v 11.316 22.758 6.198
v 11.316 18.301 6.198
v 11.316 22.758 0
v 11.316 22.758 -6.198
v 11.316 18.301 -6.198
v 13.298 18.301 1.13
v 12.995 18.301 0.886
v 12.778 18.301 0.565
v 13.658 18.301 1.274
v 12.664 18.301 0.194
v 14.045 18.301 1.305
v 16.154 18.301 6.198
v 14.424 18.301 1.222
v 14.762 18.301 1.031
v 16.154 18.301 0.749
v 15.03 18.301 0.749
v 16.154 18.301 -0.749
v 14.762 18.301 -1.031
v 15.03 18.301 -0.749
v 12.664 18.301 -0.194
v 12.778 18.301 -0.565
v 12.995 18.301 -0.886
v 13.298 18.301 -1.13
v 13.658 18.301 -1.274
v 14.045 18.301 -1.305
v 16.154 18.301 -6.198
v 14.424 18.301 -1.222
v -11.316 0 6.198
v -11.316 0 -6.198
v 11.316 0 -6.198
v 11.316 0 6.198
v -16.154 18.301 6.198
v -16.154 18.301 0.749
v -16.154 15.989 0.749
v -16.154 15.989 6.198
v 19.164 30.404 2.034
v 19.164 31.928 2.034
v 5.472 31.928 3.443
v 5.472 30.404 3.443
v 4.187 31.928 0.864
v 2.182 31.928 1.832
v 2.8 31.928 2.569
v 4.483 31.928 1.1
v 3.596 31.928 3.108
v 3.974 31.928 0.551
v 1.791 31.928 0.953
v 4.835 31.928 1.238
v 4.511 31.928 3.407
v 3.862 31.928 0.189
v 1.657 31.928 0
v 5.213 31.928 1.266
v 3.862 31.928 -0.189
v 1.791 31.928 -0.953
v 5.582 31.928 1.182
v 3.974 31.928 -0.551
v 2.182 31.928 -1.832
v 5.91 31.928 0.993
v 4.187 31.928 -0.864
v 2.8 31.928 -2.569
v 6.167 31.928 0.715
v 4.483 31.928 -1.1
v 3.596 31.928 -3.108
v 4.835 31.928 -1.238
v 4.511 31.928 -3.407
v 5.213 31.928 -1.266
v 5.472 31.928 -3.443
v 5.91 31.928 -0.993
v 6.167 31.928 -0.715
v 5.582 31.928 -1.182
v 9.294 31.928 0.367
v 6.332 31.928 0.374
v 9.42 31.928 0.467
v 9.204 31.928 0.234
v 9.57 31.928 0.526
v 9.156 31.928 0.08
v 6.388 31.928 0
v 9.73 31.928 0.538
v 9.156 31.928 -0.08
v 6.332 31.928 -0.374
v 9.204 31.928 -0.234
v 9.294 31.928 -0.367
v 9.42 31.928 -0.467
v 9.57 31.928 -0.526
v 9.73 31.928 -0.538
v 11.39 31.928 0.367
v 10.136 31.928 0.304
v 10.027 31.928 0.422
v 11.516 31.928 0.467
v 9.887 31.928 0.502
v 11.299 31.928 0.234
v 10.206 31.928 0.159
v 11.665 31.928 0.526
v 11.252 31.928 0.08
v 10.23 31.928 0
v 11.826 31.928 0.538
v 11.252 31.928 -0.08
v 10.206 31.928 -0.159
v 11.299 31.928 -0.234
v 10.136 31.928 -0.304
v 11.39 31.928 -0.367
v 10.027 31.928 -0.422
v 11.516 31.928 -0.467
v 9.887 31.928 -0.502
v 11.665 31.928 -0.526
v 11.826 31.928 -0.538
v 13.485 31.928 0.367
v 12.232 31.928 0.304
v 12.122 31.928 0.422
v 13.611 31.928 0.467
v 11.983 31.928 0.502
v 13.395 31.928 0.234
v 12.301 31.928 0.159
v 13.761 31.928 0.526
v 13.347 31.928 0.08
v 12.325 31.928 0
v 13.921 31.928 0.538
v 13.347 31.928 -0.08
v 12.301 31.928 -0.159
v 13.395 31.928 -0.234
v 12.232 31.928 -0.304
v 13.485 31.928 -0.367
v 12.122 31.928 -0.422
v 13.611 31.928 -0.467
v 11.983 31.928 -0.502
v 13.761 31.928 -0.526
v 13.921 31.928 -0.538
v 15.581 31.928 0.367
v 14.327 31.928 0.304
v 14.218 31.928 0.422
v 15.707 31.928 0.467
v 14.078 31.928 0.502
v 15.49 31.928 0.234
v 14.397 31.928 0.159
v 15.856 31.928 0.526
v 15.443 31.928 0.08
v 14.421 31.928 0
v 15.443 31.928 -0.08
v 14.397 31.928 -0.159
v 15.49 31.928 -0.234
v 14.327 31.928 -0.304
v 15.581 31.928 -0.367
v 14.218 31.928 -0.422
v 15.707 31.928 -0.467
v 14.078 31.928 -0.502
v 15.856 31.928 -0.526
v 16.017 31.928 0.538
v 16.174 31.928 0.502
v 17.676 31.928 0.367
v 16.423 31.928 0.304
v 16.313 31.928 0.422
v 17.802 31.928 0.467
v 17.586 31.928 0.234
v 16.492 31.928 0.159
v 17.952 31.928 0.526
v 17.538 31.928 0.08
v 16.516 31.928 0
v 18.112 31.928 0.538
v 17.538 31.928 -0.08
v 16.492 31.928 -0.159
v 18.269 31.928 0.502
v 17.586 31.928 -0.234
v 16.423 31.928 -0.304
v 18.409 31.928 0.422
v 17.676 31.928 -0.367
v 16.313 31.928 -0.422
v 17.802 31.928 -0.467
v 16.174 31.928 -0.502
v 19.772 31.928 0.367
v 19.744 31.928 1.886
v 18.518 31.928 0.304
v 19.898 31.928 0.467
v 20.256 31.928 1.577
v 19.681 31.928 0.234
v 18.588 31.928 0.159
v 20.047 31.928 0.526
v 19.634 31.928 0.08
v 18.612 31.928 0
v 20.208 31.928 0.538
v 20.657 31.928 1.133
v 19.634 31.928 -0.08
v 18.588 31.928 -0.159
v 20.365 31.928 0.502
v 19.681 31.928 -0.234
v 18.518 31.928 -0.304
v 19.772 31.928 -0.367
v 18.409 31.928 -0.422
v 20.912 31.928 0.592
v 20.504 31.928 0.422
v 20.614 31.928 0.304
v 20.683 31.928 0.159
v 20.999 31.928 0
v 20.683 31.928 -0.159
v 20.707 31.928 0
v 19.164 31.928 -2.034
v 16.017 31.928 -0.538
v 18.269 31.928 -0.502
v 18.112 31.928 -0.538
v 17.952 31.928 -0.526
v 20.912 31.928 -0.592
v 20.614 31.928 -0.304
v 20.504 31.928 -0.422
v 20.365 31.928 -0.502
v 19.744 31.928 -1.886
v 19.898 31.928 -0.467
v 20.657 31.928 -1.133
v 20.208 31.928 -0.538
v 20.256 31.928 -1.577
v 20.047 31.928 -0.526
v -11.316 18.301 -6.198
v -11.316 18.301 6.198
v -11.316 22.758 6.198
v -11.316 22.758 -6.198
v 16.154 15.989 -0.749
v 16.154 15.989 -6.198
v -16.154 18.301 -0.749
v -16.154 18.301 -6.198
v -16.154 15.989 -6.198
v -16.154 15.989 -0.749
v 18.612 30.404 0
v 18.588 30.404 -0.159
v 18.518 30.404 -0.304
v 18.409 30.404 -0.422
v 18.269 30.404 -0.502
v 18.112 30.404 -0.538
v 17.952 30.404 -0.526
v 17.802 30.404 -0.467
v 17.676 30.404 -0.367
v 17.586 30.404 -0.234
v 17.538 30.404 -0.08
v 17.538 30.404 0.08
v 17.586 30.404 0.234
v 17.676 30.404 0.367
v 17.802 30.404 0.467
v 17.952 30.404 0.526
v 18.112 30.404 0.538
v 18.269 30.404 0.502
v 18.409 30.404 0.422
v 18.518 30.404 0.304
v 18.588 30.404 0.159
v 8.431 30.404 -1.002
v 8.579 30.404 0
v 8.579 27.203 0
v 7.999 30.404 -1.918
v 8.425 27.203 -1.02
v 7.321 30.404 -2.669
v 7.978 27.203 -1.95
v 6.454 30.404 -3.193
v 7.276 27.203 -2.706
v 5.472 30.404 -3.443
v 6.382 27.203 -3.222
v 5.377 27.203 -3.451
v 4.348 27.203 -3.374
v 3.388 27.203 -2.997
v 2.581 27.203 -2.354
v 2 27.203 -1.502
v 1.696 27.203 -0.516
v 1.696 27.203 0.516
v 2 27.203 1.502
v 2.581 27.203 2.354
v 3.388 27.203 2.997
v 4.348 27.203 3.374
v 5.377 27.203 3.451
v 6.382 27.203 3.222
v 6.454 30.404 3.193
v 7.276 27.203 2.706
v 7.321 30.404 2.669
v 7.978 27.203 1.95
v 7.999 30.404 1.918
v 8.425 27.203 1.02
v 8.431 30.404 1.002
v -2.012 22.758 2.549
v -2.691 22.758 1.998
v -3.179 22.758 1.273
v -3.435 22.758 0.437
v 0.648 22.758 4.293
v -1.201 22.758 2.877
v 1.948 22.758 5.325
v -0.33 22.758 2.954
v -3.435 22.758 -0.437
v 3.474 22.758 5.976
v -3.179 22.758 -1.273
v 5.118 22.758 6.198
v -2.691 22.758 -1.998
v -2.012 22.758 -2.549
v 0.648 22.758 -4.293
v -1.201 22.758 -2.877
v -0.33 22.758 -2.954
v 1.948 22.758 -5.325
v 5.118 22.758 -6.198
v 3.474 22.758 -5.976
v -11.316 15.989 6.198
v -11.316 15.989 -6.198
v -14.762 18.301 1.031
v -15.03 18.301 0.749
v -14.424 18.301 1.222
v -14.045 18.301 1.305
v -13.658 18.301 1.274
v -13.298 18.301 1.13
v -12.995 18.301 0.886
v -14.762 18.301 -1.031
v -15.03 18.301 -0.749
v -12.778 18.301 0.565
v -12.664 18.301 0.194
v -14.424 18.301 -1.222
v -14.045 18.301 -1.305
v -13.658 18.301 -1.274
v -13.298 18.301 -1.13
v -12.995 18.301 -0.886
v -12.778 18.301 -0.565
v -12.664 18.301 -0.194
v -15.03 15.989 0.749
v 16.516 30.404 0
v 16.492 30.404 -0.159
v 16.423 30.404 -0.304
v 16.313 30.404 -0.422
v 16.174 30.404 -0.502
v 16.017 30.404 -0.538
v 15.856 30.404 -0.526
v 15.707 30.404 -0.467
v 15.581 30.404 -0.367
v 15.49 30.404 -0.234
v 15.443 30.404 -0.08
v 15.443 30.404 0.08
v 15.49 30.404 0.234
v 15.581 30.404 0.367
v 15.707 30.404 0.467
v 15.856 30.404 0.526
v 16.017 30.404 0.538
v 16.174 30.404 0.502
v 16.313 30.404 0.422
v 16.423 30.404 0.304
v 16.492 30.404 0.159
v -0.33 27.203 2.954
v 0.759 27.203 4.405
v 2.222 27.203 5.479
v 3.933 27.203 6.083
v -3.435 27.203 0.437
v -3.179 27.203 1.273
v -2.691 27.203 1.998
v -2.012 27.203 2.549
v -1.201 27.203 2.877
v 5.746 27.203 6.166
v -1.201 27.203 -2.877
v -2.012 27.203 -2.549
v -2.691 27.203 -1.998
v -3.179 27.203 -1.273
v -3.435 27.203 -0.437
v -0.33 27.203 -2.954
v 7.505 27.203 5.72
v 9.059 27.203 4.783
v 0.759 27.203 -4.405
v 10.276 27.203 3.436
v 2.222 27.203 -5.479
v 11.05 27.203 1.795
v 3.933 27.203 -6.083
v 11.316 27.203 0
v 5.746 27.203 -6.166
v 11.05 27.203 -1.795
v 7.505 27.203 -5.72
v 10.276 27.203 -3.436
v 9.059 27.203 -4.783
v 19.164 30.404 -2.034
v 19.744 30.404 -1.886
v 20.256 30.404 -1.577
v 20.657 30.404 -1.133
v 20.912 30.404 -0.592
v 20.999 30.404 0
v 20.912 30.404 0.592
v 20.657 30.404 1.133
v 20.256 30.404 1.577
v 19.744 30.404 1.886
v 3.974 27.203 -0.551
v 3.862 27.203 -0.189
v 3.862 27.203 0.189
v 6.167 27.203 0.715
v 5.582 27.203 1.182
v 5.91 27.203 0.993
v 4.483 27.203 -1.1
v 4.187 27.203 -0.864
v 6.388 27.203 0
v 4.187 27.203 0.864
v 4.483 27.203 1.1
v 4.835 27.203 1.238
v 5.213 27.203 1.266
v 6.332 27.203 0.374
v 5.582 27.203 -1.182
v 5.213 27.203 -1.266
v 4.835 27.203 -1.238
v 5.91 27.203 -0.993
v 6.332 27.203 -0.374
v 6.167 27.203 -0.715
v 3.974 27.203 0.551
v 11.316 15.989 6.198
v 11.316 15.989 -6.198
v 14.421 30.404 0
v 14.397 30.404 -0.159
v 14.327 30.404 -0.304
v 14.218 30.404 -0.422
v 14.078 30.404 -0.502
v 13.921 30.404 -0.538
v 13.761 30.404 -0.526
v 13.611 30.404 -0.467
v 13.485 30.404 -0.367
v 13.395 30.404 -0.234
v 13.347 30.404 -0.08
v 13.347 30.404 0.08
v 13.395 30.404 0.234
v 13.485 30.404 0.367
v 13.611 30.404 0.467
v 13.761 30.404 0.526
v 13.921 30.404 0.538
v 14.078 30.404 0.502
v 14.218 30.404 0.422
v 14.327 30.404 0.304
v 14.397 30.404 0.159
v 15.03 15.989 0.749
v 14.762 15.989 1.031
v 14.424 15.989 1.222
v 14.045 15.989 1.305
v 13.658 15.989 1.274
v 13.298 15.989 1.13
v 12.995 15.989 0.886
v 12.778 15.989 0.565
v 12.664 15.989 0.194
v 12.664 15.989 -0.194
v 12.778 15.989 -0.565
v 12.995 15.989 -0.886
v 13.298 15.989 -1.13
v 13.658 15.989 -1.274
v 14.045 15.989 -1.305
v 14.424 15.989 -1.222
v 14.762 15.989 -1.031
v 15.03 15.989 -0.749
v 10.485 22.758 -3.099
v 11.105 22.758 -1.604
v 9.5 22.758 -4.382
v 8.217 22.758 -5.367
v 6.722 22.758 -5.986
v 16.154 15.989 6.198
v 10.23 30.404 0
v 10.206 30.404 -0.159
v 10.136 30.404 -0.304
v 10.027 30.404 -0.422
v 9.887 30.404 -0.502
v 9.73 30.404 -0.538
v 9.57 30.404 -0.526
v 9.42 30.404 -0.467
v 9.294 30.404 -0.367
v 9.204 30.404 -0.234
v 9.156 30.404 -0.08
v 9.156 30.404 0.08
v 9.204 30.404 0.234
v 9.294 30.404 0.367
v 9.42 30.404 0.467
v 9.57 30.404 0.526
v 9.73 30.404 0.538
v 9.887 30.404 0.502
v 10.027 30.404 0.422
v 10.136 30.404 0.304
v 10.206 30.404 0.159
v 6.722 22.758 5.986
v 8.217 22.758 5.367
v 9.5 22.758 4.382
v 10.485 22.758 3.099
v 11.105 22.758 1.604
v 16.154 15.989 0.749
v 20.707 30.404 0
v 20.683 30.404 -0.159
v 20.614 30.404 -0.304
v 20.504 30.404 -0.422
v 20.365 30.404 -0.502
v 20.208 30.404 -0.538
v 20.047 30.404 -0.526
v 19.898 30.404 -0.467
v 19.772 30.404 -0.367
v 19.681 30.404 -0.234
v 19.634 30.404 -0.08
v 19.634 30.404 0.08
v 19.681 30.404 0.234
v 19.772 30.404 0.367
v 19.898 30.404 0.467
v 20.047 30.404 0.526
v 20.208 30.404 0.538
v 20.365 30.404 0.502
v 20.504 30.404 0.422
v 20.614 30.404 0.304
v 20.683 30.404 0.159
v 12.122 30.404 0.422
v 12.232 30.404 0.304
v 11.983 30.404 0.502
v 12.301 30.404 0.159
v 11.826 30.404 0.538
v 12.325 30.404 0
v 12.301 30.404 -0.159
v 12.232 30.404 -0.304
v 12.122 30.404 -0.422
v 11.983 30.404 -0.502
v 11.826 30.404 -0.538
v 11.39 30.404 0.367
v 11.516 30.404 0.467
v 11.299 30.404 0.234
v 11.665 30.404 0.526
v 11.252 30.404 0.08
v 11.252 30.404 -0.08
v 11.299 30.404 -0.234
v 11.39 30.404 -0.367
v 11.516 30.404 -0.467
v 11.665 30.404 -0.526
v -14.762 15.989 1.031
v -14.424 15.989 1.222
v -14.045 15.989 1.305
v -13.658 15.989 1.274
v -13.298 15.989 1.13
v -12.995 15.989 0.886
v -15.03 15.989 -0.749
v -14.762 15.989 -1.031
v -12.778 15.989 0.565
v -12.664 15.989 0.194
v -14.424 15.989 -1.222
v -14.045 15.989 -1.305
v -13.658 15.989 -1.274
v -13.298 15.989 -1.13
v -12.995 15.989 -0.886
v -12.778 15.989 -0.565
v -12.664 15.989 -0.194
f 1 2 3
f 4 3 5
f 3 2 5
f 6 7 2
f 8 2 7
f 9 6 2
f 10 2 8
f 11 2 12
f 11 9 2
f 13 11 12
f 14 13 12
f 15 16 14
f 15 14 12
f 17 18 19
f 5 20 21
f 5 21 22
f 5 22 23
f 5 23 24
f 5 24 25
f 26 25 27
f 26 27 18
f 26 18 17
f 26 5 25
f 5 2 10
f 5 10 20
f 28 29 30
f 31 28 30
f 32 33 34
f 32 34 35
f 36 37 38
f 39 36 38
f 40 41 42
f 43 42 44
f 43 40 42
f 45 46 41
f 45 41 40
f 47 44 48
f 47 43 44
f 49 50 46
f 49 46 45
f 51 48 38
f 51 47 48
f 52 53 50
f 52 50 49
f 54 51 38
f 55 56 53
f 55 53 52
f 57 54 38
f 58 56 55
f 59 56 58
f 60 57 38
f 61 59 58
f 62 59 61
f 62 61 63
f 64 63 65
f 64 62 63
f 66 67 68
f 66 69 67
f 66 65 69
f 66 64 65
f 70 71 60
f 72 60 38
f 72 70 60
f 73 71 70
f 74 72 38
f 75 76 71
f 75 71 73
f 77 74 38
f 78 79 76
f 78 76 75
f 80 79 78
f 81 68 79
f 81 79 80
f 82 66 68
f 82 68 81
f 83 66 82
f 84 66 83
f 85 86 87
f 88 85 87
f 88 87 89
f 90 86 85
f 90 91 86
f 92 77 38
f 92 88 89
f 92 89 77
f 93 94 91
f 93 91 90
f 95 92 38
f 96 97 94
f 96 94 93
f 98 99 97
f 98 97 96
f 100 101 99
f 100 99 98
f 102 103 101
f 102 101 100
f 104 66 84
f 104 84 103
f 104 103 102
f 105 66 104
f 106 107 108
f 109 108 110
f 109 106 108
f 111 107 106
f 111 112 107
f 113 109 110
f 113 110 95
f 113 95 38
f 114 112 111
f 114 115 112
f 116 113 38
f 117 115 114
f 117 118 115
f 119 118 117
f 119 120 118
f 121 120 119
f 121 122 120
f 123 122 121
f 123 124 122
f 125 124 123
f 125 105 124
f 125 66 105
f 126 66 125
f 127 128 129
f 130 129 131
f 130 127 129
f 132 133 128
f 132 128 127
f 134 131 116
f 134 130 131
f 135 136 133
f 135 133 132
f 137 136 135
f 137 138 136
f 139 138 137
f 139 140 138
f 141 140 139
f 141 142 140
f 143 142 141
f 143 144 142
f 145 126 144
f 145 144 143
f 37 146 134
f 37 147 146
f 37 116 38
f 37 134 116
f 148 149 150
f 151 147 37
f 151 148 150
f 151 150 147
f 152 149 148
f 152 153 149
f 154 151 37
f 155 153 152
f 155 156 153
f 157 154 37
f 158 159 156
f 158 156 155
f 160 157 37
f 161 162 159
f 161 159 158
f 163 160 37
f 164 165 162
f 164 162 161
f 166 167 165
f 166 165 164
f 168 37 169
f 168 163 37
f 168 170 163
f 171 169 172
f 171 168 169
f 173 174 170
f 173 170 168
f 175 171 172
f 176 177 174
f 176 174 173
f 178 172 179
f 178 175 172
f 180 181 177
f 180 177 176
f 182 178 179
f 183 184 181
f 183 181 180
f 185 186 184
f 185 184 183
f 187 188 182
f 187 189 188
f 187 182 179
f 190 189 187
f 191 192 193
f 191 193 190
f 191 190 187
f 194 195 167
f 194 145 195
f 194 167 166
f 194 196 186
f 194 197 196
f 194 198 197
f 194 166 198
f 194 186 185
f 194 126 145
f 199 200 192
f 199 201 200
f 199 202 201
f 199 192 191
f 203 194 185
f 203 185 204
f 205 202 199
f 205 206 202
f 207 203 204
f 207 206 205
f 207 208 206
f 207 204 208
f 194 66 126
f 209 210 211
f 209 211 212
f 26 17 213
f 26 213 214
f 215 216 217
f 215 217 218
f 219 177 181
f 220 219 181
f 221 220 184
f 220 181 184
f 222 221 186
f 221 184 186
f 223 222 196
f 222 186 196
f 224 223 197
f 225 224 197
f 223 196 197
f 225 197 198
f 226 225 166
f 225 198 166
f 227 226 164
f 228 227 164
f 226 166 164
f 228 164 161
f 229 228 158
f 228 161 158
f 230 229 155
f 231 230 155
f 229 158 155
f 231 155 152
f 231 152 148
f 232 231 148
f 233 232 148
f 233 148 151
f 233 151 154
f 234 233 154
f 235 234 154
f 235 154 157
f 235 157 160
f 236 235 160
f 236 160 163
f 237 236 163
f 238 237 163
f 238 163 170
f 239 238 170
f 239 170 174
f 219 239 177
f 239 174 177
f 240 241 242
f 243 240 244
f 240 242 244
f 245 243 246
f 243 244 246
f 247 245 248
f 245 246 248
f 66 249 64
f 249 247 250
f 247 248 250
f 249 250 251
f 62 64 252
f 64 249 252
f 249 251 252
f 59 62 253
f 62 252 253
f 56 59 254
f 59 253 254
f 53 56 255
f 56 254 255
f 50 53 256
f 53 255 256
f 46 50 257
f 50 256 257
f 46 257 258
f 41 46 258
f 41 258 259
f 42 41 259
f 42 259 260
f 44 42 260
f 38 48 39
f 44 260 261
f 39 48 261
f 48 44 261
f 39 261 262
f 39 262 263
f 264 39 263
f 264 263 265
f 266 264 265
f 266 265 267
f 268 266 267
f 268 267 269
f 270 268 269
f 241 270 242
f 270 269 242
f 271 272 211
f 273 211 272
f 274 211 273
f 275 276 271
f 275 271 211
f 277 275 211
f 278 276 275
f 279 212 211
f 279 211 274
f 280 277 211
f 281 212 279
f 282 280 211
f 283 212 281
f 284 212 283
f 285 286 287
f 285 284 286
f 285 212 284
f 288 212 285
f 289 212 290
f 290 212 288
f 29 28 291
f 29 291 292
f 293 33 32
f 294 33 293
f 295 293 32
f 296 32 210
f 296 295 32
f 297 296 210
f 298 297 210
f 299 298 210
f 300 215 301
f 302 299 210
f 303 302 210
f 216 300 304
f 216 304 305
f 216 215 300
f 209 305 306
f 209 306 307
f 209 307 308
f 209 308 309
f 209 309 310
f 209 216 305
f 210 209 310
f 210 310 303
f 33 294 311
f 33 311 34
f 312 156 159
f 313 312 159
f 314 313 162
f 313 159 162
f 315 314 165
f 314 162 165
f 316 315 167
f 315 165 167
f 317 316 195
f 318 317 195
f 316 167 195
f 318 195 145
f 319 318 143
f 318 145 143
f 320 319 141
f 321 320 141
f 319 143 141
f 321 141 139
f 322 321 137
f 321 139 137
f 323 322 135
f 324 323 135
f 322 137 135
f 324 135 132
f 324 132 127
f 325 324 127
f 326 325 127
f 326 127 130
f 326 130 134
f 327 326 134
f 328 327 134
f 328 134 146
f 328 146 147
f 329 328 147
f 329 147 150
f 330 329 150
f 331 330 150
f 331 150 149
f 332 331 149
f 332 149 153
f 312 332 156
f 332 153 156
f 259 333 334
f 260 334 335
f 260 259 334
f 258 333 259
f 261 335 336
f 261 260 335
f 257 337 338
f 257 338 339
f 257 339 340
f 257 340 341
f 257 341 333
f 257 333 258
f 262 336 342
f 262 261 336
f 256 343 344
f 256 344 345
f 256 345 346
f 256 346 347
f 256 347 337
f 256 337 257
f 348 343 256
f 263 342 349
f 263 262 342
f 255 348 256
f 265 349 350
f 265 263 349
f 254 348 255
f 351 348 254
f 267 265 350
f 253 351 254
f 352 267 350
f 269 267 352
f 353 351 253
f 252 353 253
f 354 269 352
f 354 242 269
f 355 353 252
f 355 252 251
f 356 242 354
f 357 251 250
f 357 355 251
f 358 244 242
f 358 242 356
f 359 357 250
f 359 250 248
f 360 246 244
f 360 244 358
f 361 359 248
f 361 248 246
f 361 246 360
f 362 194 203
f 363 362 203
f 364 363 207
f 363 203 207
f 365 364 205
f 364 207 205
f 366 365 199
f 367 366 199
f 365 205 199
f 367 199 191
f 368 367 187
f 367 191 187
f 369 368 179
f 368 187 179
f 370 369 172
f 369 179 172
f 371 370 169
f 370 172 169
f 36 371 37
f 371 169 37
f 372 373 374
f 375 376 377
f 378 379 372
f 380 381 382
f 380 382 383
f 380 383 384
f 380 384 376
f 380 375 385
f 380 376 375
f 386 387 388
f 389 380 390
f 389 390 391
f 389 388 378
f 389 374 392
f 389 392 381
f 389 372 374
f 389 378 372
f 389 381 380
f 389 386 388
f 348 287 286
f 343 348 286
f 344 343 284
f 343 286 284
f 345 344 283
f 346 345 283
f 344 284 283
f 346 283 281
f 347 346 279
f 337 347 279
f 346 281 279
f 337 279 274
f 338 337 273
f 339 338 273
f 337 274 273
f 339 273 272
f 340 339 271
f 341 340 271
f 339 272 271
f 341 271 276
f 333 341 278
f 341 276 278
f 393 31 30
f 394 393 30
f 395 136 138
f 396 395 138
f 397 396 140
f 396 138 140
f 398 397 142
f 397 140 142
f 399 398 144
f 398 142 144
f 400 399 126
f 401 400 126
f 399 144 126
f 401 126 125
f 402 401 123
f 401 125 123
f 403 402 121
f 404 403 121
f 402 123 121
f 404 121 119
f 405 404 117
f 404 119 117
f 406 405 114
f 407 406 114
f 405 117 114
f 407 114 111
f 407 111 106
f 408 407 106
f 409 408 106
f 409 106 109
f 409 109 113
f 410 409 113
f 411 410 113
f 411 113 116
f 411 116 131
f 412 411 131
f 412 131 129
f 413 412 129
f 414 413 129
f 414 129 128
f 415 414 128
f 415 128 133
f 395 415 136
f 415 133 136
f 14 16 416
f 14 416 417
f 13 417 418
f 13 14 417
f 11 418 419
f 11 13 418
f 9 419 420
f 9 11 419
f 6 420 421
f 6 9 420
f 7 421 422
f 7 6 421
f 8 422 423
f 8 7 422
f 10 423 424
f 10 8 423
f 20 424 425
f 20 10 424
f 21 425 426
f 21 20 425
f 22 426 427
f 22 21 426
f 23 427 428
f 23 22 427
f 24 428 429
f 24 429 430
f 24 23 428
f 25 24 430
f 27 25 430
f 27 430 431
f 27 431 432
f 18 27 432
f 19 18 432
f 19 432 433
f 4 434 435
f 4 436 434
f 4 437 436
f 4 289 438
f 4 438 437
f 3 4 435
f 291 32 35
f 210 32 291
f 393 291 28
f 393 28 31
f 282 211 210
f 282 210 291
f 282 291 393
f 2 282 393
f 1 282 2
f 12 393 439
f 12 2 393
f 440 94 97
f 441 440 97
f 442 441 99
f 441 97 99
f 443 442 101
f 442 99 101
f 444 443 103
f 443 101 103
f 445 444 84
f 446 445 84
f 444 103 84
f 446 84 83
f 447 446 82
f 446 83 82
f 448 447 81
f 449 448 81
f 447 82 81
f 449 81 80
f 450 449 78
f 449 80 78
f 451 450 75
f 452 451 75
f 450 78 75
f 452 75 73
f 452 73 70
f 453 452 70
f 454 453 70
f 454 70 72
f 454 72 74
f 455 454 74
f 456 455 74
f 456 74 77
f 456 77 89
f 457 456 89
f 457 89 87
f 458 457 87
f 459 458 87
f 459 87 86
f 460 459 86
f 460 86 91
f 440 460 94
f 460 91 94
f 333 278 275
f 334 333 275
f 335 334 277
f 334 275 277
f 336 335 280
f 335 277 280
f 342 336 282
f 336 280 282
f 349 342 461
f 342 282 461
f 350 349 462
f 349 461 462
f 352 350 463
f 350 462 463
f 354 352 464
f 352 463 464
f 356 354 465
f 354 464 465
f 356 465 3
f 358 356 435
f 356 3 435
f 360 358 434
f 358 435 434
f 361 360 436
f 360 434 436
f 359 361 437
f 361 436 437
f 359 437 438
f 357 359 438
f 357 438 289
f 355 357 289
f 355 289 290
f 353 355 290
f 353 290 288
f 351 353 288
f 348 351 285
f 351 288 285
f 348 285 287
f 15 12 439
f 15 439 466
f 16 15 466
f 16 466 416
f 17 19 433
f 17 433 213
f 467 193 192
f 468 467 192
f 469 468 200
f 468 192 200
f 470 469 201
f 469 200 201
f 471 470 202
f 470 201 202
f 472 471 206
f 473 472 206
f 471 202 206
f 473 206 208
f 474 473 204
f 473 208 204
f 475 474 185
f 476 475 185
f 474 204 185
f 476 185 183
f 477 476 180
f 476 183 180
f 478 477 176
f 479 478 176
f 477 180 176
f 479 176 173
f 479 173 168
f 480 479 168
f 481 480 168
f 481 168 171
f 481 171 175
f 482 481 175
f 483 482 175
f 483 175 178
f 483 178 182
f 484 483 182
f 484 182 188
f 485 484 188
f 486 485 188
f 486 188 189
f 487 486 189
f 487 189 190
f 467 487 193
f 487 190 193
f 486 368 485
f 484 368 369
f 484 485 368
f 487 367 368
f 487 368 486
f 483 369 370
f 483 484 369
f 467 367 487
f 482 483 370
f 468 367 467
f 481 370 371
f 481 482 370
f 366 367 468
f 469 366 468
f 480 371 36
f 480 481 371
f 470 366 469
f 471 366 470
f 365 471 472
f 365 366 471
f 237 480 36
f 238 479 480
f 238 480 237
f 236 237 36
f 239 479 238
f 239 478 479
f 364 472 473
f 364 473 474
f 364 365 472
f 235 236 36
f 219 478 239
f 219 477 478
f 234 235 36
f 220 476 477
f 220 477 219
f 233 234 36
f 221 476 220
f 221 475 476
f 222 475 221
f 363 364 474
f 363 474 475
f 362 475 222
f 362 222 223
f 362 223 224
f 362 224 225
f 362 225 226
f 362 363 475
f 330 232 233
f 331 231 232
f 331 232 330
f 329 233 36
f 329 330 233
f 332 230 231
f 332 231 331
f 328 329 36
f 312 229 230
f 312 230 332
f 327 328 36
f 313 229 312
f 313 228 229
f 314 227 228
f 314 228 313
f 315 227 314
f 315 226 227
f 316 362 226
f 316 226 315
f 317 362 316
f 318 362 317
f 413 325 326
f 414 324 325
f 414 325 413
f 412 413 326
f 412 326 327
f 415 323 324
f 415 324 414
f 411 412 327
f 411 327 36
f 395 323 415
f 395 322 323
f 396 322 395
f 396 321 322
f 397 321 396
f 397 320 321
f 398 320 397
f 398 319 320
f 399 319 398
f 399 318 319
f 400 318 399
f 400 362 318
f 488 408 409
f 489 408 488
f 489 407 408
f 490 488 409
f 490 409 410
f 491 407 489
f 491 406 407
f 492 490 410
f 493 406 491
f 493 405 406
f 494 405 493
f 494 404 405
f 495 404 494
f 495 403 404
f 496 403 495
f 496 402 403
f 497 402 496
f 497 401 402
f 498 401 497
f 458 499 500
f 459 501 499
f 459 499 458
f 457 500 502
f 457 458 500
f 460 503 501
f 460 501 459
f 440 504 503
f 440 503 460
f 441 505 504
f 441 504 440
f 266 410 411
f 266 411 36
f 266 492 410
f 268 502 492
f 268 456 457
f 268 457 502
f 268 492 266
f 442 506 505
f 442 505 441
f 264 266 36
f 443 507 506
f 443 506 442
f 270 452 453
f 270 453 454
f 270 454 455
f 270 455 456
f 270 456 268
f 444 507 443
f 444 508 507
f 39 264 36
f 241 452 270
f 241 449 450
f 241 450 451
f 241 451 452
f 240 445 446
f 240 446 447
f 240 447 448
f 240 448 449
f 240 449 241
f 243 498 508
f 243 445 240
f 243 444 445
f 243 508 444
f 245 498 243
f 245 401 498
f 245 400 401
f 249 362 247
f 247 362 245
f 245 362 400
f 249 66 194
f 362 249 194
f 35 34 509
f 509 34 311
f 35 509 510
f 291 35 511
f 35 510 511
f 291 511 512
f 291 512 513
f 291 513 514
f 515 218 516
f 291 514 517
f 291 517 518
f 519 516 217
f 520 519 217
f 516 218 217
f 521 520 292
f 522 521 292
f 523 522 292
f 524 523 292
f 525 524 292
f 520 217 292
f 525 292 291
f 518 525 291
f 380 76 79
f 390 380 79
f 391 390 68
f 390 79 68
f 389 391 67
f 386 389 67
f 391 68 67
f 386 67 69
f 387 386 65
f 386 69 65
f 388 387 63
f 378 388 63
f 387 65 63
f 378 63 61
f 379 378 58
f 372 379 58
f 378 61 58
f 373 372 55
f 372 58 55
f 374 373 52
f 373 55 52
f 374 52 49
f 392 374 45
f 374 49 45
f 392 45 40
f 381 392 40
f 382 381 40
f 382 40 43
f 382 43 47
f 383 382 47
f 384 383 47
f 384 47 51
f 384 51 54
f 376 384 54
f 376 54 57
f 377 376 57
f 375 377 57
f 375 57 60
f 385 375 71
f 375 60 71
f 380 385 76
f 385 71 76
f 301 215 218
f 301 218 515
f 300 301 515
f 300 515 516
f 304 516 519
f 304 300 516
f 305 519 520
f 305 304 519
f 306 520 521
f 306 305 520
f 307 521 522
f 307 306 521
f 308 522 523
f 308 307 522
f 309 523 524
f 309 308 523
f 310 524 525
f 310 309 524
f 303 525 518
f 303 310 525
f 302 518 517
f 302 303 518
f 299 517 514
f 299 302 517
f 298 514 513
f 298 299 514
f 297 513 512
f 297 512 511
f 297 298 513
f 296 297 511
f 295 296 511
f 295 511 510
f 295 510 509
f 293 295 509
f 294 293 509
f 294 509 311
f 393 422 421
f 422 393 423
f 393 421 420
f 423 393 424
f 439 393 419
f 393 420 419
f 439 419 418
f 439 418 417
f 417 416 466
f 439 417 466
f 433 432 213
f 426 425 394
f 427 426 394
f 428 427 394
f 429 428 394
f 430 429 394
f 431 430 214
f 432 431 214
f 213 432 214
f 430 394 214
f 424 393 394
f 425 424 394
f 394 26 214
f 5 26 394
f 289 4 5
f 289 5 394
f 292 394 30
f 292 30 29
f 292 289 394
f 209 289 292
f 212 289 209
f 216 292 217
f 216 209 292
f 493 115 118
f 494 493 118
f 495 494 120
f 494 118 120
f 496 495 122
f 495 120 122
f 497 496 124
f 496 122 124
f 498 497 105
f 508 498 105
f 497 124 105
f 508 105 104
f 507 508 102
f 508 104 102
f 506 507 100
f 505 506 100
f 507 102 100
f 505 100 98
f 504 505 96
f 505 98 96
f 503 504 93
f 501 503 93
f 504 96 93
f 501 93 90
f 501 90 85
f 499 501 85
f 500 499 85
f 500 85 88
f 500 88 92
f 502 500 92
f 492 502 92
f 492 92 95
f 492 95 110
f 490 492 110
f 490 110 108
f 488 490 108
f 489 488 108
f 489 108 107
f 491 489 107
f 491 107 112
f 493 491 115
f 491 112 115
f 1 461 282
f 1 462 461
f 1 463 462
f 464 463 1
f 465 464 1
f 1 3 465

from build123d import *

# Parameters (mm, degrees)
SKETCH1_W           = 22.6314
SKETCH1_H           = 12.3952
BOSS_EXTRUDE1_DEPTH = 22.7584
BOSS_EXTRUDE2_DEPTH = 4.445
SKETCH3_R           = 3.46075
BOSS_EXTRUDE3_DEPTH = 4.7244
SKETCH4_R           = 0.53975
BOSS_EXTRUDE4_DEPTH = 1.524
BOSS_EXTRUDE5_DEPTH = 2.3114
SKETCH6_R           = 1.27
CUT_EXTRUDE1_DEPTH  = 4.7244


with BuildPart() as part:
    # Sketch1 → Boss-Extrude1 (new body)
    with BuildSketch(Plane(origin=(0, 0, 0), x_dir=(1, 0, 0), z_dir=(0, 1, 0))):
        Rectangle(SKETCH1_W, SKETCH1_H)
    extrude(amount=BOSS_EXTRUDE1_DEPTH)

    # Sketch2 → Boss-Extrude2 (add)
    with BuildSketch(Plane(origin=(0, 22.7584, 0), x_dir=(1, 0, 0), z_dir=(0, 1, 0))):
        with BuildLine():
            ThreePointArc((-0.330343341, -2.953762164), (11.3157, 0), (-0.330343341, 2.953762164))
            ThreePointArc((-0.330343341, 2.953762164), (-3.4671, 0), (-0.330343341, -2.953762164))
        make_face()
    extrude(amount=BOSS_EXTRUDE2_DEPTH)

    # Sketch3 → Boss-Extrude3 (add)
    with BuildSketch(Plane(origin=(0, 27.2034, 0), x_dir=(1, 0, 0), z_dir=(0, 1, 0))):
        with Locations((5.1181, 0)):
            Circle(SKETCH3_R)
    extrude(amount=BOSS_EXTRUDE3_DEPTH)

    # Sketch4 → Boss-Extrude4 (add)
    with BuildSketch(Plane(origin=(0, 31.9278, 0), x_dir=(1, 0, 0), z_dir=(0, 1, 0))):
        with BuildLine():
            Line((5.472274966, 3.44257907), (19.164005668, 2.033964148))
            ThreePointArc((19.164005668, 2.033964148), (20.99945, 0), (19.164005668, -2.033964148))
            Line((19.164005668, -2.033964148), (5.472274966, -3.44257907))
            ThreePointArc((5.472274966, -3.44257907), (1.65735, 0), (5.472274966, 3.44257907))
        make_face()
        with Locations((11.7856, 0)):
            Circle(SKETCH4_R, mode=Mode.SUBTRACT)
        with Locations((9.6901, 0)):
            Circle(SKETCH4_R, mode=Mode.SUBTRACT)
        with Locations((13.8811, 0)):
            Circle(SKETCH4_R, mode=Mode.SUBTRACT)
        with Locations((15.9766, 0)):
            Circle(SKETCH4_R, mode=Mode.SUBTRACT)
        with Locations((18.0721, 0)):
            Circle(SKETCH4_R, mode=Mode.SUBTRACT)
        with Locations((20.1676, 0)):
            Circle(SKETCH4_R, mode=Mode.SUBTRACT)
    extrude(amount=-BOSS_EXTRUDE4_DEPTH)

    # Sketch5 → Boss-Extrude5 (add)
    with BuildSketch(Plane(origin=(0, 18.3007, 0), x_dir=(1, 0, 0), z_dir=(0, 1, 0))):
        with BuildLine():
            Line((-16.1544, -6.1976), (16.1544, -6.1976))
            Line((16.1544, -6.1976), (16.1544, -0.7493))
            Line((16.1544, -0.7493), (15.029529043, -0.7493))
            ThreePointArc((15.029529043, -0.7493), (12.6492, 0), (15.029529043, 0.7493))
            Line((15.029529043, 0.7493), (16.1544, 0.7493))
            Line((16.1544, 0.7493), (16.1544, 6.1976))
            Line((16.1544, 6.1976), (-16.1544, 6.1976))
            Line((-16.1544, 6.1976), (-16.1544, 0.7493))
            Line((-16.1544, 0.7493), (-15.029529043, 0.7493))
            ThreePointArc((-15.029529043, 0.7493), (-12.6492, 0), (-15.029529043, -0.7493))
            Line((-15.029529043, -0.7493), (-16.1544, -0.7493))
            Line((-16.1544, -0.7493), (-16.1544, -6.1976))
        make_face()
    extrude(amount=-BOSS_EXTRUDE5_DEPTH)

    # Sketch6 → Cut-Extrude1 (cut)
    with BuildSketch(Plane(origin=(0, 31.9278, 0), x_dir=(1, 0, 0), z_dir=(0, 1, 0))):
        with Locations((5.1181, 0)):
            Circle(SKETCH6_R)
    extrude(amount=-CUT_EXTRUDE1_DEPTH, mode=Mode.SUBTRACT)


solid = part.part
